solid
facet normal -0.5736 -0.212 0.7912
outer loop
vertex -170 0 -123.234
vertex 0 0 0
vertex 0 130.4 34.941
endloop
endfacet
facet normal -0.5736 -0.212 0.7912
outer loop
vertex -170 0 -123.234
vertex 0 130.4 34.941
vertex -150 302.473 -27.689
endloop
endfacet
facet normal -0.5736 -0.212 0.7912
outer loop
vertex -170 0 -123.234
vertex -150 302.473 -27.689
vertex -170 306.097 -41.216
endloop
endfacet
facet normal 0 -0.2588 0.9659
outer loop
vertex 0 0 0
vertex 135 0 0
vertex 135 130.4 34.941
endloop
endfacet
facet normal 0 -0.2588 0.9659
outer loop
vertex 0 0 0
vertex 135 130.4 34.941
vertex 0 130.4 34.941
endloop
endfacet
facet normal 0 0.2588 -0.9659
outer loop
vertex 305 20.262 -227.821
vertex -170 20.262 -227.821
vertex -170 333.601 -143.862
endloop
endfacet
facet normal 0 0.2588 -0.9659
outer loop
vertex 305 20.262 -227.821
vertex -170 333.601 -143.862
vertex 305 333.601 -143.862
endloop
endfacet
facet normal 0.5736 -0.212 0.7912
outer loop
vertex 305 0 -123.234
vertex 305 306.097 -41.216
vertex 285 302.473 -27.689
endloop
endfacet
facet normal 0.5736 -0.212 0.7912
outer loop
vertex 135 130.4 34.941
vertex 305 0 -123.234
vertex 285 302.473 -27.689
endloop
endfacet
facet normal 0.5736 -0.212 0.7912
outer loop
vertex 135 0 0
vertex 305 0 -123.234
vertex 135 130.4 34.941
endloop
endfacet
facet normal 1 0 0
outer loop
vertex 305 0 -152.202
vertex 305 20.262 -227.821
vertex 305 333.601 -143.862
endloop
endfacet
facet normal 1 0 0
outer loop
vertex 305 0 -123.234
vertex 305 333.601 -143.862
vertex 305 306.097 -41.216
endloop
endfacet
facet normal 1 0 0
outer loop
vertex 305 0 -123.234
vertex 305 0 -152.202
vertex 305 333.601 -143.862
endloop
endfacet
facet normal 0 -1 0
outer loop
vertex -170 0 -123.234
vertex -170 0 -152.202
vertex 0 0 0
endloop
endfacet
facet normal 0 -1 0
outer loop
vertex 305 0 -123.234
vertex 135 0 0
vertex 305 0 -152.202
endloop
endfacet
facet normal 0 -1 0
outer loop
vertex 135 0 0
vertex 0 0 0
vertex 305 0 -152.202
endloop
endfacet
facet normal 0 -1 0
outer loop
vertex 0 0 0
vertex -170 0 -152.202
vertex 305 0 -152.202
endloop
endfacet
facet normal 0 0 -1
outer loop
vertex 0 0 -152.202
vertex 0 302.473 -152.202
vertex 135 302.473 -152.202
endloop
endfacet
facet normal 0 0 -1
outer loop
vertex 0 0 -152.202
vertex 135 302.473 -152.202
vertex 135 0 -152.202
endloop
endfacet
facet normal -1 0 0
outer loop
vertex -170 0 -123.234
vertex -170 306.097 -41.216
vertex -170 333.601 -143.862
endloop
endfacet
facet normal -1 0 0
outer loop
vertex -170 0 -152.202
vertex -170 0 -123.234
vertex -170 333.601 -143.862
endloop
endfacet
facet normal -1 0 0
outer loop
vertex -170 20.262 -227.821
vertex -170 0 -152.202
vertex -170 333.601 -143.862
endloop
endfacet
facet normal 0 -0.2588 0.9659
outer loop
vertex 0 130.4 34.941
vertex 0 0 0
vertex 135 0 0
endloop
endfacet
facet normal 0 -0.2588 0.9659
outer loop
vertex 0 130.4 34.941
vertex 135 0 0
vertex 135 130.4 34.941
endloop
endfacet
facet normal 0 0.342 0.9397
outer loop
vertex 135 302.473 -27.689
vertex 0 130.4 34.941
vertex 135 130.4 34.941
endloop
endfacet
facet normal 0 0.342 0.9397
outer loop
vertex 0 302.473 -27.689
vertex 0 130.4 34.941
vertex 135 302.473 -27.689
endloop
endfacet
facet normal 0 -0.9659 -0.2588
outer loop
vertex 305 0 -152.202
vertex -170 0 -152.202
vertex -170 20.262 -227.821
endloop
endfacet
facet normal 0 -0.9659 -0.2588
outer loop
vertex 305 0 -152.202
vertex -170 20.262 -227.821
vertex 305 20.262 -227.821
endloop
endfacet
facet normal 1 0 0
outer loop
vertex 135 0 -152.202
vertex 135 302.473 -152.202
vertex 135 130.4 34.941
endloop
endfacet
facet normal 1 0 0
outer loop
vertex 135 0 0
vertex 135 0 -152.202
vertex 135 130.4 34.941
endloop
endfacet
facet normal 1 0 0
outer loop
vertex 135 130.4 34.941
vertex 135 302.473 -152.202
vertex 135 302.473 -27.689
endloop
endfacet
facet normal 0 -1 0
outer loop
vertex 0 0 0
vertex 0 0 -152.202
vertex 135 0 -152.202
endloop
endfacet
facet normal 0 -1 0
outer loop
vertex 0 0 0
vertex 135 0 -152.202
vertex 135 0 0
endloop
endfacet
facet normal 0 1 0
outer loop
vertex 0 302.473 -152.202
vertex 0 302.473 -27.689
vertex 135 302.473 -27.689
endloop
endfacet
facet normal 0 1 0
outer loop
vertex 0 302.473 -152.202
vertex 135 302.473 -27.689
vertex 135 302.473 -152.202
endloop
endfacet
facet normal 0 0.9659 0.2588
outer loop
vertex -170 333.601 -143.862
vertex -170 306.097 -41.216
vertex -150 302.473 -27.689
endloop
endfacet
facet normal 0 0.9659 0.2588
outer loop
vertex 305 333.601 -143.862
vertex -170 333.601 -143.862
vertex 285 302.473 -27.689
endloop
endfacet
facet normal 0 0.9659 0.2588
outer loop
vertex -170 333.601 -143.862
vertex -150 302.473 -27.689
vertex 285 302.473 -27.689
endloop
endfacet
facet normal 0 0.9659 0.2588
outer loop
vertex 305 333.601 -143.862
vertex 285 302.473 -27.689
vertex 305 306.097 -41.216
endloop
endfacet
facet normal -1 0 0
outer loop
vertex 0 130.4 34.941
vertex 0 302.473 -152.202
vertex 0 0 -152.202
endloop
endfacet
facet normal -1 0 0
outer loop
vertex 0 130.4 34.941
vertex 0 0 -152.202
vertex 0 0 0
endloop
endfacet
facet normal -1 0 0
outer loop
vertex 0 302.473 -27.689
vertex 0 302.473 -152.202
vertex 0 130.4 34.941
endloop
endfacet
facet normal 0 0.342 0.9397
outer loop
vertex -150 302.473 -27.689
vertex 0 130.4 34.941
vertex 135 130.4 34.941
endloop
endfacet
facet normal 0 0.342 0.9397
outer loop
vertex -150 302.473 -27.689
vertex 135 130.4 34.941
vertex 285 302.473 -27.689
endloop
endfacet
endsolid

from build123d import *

# Parameters (mm, degrees)
BOSS_EXTRUDE3_DEPTH      = 135
BOSS_EXTRUDE4_DEPTH      = 150
BOSS_EXTRUDE4_DEPTH_BACK = 174.392904
SKETCH5_W                = 537.073181065
SKETCH5_H                = 322.774913197
CUT_EXTRUDE1_DEPTH       = 507.178946947
CUT_EXTRUDE2_DEPTH       = 507.178946947
CUT_EXTRUDE2_DEPTH_BACK  = 507.178946947


with BuildPart() as part:
    # Sketch3 → Boss-Extrude3 (new body)
    with BuildSketch(Plane(origin=(0, 0, 0), x_dir=(0, 0, -1), z_dir=(1, 0, 0))):
        Polygon((0, 0), (-34.940571089, 130.399986549), (27.688853884, 302.472917454), (152.202491734, 302.472917454), (152.202491734, 0), align=None)
    extrude(amount=BOSS_EXTRUDE3_DEPTH)


with BuildPart() as body_2:
    # Sketch4 → Boss-Extrude4 (new, two sides: drawn at the far end of the back side and taken through both)
    with BuildSketch(Plane(origin=(0, 130.399986549, 34.940571089), x_dir=(-1, 0, 0), z_dir=(0, 0.9659258262890673, 0.2588190451025249)).offset(-BOSS_EXTRUDE4_DEPTH_BACK)):
        Polygon((-305, -119.035281496), (-135, 0), (0, 0), (170, -119.035281496), (170, -225.302069257), (-305, -225.302069257), align=None)
    extrude(amount=BOSS_EXTRUDE4_DEPTH + BOSS_EXTRUDE4_DEPTH_BACK)

    # Sketch5 → Cut-Extrude1 (cut, through all)
    with BuildSketch(Plane(origin=(0, 0, 0), x_dir=(1, 0, 0), z_dir=(0, 1, 0))):
        with Locations((80.775113939, 87.718094791)):
            Rectangle(SKETCH5_W, SKETCH5_H)
    extrude(amount=-CUT_EXTRUDE1_DEPTH, mode=Mode.SUBTRACT)

    # Sketch6 → Cut-Extrude2 (cut, two sides: drawn at the far end of the back side and taken through both)
    with BuildSketch(Plane(origin=(0, 0, 0), x_dir=(0, 0, -1), z_dir=(1, 0, 0)).offset(-CUT_EXTRUDE2_DEPTH_BACK)):
        Polygon((-34.940571089, 130.399986549), (35.560367214, 324.099722587), (-80.993250265, 302.270925058), align=None)
    extrude(amount=CUT_EXTRUDE2_DEPTH + CUT_EXTRUDE2_DEPTH_BACK, mode=Mode.SUBTRACT)


solid = Compound([part.part, body_2.part])
